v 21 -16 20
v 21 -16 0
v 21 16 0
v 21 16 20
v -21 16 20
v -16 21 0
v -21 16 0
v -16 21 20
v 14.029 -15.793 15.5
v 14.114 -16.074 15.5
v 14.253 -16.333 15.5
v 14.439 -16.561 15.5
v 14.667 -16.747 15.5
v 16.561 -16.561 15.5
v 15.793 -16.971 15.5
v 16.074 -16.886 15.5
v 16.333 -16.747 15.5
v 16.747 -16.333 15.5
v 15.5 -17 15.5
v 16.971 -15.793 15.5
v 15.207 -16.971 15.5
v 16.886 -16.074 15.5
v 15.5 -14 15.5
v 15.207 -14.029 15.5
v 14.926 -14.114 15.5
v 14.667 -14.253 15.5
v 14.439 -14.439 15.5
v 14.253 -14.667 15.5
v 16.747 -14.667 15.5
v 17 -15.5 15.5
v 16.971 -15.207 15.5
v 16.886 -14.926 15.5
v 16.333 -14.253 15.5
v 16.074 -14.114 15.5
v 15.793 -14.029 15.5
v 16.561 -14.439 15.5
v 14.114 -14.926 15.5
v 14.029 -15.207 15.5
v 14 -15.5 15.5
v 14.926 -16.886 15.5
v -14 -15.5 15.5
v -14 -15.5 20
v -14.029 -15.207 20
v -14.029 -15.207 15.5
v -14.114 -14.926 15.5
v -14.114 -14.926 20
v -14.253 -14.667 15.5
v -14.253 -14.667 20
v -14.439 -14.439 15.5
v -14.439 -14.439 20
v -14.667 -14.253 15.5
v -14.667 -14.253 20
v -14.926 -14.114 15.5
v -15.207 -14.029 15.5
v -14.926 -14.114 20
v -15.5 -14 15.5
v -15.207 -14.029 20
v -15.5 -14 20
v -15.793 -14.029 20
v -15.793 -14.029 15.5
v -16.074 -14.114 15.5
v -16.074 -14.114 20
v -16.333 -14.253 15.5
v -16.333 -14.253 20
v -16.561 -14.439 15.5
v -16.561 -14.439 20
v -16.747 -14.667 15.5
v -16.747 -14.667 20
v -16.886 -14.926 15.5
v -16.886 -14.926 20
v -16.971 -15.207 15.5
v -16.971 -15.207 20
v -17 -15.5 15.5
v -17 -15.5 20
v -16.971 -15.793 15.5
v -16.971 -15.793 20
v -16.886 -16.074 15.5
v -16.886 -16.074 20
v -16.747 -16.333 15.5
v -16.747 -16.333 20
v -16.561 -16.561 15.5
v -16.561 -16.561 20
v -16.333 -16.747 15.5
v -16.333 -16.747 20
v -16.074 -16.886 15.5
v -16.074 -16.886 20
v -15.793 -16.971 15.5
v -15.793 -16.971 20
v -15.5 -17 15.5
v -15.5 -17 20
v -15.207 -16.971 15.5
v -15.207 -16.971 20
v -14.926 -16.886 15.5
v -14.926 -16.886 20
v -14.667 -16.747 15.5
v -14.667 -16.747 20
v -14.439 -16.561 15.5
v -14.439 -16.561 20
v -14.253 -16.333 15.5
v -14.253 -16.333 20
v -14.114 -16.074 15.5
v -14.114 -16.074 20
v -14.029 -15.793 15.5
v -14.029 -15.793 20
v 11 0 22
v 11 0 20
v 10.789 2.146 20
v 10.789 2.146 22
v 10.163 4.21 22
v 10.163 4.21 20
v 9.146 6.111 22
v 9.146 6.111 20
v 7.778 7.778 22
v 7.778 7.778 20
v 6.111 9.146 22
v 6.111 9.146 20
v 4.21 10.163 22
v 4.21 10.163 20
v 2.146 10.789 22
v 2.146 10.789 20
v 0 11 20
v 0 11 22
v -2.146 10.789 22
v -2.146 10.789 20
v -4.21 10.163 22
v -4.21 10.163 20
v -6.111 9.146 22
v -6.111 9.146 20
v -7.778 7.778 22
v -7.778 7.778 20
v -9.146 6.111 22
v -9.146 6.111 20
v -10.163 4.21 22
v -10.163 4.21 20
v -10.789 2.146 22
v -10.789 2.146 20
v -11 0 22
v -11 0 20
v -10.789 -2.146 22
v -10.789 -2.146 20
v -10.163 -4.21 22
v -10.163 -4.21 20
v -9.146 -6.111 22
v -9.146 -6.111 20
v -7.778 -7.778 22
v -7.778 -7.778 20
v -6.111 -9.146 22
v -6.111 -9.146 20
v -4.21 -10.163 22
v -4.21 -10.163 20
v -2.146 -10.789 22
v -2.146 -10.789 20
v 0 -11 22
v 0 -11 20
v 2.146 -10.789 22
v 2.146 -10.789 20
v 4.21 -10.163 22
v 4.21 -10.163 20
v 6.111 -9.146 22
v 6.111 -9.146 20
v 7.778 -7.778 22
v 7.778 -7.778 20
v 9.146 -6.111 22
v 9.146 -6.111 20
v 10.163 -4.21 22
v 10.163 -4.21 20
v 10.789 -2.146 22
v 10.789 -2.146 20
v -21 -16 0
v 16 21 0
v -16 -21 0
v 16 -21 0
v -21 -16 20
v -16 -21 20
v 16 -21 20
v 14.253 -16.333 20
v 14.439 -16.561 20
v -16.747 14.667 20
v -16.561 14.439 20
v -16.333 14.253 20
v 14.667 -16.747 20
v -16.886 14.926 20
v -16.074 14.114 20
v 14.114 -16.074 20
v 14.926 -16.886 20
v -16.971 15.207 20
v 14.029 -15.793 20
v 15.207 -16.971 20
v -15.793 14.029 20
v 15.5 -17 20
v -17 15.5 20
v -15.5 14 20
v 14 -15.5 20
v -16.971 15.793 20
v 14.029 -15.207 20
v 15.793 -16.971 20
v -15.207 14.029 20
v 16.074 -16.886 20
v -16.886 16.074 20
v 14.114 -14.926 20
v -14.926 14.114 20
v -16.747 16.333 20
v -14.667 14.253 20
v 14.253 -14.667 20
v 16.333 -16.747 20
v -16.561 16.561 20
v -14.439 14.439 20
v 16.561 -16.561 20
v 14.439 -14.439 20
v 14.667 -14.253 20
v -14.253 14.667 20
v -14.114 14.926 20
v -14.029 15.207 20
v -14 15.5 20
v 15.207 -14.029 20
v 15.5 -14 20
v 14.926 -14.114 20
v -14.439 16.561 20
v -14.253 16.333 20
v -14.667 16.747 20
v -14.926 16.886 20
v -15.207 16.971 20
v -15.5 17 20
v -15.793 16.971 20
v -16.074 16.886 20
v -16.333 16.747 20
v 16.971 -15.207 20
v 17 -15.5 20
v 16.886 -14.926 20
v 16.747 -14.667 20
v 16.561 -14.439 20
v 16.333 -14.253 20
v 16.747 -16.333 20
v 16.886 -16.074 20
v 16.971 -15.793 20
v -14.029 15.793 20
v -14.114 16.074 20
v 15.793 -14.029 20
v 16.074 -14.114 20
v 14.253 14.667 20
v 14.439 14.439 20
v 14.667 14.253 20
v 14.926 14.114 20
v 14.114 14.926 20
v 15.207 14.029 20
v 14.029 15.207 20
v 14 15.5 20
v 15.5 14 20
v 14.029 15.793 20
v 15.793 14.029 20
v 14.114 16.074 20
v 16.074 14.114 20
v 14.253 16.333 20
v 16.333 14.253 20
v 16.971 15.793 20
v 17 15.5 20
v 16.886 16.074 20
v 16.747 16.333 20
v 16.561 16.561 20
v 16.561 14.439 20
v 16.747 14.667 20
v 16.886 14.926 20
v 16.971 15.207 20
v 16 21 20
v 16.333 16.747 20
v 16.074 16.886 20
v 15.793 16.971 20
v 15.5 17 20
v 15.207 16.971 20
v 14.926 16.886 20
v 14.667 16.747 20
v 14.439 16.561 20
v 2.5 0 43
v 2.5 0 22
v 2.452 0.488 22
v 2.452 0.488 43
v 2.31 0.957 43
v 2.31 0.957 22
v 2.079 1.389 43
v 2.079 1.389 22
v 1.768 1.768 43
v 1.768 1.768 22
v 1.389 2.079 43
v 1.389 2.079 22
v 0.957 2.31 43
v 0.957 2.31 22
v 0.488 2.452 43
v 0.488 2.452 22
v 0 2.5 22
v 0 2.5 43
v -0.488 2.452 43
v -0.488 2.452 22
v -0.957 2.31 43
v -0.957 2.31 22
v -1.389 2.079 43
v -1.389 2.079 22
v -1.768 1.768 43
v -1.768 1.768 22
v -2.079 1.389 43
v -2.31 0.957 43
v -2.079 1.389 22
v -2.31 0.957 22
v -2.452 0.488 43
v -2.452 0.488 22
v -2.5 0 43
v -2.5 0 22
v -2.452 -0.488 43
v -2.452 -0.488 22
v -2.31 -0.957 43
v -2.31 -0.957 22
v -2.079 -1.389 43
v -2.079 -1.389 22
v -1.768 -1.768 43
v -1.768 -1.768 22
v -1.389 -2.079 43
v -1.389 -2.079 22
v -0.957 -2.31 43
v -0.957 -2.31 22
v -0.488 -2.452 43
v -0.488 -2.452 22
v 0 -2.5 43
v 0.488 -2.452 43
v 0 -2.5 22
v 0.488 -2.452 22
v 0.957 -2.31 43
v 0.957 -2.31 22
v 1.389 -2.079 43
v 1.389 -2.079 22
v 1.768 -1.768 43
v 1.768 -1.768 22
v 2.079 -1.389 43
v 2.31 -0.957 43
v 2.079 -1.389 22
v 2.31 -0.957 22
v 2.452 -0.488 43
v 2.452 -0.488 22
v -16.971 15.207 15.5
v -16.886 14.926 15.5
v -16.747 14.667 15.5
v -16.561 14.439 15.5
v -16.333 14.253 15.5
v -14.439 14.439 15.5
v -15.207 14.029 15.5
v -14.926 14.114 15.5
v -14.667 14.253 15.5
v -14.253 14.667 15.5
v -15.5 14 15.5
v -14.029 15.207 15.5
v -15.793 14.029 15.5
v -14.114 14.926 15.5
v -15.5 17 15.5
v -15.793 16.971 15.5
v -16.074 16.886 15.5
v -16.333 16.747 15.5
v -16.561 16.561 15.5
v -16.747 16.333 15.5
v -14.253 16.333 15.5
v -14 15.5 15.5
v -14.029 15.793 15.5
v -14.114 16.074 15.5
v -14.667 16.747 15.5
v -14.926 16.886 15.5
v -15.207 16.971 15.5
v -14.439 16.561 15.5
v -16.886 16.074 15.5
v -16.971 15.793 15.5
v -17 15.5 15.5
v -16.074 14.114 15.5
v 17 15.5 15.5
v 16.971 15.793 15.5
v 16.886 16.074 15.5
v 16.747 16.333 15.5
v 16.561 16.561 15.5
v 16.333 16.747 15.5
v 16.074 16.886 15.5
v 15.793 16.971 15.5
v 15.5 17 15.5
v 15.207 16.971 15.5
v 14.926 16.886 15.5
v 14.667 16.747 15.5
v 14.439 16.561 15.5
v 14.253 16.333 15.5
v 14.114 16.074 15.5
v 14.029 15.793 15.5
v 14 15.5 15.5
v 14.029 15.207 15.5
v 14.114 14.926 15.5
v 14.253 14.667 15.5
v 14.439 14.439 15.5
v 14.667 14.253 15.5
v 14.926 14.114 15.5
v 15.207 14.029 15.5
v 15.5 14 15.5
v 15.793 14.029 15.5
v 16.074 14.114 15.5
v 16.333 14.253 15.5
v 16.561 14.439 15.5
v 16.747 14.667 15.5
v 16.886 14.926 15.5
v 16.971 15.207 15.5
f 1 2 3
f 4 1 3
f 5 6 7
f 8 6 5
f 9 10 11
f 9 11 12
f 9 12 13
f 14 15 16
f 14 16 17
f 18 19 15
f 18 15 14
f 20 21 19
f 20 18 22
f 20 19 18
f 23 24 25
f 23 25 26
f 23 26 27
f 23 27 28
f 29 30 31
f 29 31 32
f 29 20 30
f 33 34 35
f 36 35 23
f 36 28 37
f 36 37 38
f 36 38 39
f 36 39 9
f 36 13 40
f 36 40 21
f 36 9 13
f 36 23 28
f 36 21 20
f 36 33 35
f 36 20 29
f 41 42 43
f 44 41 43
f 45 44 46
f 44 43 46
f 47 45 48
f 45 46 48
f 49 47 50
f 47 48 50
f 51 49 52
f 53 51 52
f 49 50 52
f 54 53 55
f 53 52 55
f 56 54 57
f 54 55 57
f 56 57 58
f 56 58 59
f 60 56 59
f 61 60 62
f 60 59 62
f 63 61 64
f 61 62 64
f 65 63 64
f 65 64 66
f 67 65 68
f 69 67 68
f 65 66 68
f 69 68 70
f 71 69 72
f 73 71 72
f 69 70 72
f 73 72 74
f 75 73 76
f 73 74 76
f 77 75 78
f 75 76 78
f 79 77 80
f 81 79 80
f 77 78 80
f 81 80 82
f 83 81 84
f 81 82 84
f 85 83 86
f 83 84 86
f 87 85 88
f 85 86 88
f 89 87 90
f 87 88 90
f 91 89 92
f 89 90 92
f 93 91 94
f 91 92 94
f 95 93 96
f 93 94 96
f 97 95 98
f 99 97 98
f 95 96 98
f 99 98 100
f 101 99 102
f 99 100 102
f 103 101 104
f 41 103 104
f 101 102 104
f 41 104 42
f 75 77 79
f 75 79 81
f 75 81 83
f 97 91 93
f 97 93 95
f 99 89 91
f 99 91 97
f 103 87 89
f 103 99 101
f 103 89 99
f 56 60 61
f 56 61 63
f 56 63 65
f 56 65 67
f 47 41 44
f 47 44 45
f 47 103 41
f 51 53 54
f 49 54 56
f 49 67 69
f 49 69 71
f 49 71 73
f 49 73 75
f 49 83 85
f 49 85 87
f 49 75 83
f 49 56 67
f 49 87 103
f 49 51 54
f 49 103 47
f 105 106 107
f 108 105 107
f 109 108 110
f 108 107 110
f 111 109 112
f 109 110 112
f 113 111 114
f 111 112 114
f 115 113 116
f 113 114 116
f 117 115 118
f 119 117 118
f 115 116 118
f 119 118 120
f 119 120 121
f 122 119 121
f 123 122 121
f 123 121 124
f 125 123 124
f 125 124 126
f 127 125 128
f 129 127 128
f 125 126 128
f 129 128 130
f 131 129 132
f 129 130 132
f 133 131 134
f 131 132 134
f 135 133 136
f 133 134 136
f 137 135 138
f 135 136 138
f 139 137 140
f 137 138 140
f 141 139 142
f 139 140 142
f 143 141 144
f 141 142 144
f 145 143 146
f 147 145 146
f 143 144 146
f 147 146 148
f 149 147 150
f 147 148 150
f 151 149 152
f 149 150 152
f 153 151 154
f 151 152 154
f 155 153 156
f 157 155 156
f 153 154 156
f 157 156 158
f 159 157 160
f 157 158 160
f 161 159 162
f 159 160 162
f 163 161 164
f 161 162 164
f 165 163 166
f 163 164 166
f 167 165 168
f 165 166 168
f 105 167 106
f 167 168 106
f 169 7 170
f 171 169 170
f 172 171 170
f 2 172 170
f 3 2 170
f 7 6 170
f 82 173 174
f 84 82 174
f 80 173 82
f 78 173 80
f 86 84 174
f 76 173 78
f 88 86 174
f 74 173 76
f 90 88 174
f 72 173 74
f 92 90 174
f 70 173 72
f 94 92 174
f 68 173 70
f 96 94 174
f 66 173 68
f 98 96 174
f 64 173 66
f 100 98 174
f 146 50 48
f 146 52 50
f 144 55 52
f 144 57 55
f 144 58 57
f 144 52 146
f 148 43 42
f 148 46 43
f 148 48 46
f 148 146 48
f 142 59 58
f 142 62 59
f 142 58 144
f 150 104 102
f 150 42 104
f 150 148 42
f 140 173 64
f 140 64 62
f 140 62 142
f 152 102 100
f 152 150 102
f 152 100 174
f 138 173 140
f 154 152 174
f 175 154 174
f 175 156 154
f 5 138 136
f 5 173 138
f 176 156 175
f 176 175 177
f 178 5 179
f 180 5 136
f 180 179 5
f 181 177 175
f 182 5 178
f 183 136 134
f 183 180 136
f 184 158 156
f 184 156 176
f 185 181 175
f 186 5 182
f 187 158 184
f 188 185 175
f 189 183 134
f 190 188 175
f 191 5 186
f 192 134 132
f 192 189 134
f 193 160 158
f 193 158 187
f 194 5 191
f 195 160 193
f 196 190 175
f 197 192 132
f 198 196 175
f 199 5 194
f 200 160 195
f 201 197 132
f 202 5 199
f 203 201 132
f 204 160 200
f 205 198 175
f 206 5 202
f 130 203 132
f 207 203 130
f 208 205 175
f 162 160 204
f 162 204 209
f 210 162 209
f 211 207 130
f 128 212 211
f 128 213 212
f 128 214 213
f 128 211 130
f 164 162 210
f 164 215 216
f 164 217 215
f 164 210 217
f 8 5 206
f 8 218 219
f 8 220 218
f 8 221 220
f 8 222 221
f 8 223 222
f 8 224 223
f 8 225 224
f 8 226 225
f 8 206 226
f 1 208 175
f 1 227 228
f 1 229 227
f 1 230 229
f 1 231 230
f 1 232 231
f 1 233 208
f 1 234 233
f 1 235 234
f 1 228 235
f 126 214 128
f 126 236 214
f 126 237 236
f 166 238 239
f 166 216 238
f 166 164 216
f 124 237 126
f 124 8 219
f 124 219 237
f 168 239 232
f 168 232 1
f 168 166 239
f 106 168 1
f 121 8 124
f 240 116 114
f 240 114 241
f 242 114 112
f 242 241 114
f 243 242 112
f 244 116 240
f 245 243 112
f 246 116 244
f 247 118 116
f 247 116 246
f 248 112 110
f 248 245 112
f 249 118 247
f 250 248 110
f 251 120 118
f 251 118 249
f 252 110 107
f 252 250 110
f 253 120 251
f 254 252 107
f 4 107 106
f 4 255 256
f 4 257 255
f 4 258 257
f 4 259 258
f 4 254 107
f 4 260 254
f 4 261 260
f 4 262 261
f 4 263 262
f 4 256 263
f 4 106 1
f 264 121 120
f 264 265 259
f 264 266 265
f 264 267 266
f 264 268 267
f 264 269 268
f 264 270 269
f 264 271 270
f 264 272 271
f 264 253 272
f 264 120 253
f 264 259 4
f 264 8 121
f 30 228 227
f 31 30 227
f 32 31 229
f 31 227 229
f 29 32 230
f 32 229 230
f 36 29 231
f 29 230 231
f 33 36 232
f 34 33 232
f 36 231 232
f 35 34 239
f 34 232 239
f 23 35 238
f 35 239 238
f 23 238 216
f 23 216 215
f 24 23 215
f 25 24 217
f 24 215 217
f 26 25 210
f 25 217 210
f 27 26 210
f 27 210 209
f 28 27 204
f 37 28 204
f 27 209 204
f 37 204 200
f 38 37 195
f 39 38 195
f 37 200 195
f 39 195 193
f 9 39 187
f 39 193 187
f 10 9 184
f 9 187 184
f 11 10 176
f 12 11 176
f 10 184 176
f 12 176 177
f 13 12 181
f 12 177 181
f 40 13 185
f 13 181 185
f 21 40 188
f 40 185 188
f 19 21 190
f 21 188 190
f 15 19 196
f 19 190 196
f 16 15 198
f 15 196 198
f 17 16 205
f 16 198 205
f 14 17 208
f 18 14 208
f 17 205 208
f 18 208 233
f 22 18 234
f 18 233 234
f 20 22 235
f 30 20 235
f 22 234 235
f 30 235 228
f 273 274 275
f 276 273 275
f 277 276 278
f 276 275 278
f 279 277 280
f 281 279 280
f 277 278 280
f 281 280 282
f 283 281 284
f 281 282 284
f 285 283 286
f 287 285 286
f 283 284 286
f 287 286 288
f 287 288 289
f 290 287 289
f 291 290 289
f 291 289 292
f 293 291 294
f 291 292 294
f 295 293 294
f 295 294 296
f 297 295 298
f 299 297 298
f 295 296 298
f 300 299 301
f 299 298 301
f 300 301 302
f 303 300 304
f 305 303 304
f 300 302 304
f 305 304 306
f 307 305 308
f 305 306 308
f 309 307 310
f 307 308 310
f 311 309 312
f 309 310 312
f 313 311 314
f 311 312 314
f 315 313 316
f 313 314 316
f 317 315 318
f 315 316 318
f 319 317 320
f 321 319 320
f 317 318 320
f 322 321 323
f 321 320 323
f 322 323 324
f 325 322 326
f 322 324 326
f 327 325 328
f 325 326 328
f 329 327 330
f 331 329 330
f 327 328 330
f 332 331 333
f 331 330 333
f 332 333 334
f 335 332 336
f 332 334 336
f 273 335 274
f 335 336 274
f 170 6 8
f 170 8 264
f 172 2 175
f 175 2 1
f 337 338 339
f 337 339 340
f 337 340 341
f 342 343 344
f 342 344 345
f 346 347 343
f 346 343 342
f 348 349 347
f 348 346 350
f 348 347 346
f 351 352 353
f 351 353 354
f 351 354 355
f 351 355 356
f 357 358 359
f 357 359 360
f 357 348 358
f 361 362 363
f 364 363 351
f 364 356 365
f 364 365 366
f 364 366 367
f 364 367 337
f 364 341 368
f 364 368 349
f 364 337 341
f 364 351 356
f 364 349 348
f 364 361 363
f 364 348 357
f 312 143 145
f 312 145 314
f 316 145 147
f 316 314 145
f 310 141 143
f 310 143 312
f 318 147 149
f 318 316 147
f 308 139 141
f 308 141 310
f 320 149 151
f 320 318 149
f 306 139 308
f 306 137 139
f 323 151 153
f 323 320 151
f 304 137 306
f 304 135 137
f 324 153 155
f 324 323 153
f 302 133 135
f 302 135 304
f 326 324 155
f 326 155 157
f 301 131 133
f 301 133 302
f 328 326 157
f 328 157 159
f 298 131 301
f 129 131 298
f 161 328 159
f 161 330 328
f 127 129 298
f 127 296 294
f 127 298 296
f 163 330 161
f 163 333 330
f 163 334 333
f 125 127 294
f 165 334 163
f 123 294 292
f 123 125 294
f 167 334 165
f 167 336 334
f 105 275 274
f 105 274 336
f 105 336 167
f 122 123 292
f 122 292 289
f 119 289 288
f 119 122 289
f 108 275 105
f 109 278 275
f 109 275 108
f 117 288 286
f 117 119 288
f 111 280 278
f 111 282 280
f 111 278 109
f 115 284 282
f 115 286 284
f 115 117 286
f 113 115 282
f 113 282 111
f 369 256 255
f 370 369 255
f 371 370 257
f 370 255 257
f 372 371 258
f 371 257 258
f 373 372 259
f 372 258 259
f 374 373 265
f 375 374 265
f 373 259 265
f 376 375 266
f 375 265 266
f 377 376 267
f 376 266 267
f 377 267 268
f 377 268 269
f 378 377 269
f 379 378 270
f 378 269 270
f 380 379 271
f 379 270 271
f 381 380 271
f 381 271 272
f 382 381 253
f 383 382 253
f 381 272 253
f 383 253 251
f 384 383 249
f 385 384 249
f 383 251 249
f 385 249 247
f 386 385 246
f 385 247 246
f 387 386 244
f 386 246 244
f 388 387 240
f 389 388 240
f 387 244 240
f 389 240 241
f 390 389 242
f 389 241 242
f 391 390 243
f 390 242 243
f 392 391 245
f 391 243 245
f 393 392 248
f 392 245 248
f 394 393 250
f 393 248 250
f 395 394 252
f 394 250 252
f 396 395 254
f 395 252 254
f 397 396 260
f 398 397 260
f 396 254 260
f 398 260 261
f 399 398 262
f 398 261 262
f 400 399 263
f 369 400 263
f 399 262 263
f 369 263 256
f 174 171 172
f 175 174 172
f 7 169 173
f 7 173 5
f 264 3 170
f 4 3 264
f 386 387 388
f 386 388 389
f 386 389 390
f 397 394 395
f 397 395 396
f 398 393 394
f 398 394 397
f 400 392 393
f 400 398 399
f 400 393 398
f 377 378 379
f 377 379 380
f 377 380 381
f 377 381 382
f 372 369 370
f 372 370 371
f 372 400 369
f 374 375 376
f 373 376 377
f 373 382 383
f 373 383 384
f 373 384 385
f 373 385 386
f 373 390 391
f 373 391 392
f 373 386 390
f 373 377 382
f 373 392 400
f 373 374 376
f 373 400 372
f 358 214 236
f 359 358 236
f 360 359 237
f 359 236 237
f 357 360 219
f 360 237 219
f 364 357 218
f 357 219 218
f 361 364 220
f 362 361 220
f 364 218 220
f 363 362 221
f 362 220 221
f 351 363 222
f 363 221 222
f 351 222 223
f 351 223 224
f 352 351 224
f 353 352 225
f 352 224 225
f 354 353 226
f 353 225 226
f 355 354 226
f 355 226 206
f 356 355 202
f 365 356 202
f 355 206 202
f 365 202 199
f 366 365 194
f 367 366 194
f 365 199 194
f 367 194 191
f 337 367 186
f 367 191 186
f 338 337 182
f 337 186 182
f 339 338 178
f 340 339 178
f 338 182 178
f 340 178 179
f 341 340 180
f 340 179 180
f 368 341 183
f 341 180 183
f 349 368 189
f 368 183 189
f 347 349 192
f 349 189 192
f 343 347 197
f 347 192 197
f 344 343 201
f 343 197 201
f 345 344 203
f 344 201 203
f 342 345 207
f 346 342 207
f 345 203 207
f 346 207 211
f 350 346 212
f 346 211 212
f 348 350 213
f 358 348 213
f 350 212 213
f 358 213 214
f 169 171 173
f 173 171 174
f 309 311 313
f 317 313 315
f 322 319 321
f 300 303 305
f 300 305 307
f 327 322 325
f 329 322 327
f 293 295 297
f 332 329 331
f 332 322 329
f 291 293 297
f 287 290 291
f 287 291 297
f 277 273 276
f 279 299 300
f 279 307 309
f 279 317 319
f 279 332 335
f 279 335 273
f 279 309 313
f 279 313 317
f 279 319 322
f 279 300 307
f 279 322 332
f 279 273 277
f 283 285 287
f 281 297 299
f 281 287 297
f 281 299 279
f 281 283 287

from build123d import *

# Parameters (mm, degrees)
F0_W     = 42
F0_H     = 42
F1_DEPTH = 20
F2_R     = 11
F3_DEPTH = 2
F4_R     = 2.5
F5_DEPTH = 21
F6_R     = 1.5
F7_DEPTH = 4.5
F8_SIZE  = 5


with BuildPart() as f1:
    # F0 (on Top) → F1 (new body)
    with BuildSketch(Plane.XY):
        Rectangle(F0_W, F0_H)
    extrude(amount=F1_DEPTH)

    # F2 (on face) → F3 (join)
    with BuildSketch(Plane.XY.offset(20)):
        Circle(F2_R)
    extrude(amount=F3_DEPTH)

    # F4 (on face) → F5 (join)
    with BuildSketch(Plane.XY.offset(22)):
        Circle(F4_R)
    extrude(amount=F5_DEPTH)

    # F6 (on face) → F7 (cut)
    with BuildSketch(Plane.XY.offset(20)):
        with Locations((-15.5, 15.5)):
            Circle(F6_R)
        with Locations((-15.5, -15.5)):
            Circle(F6_R)
        with Locations((15.5, 15.5)):
            Circle(F6_R)
        with Locations((15.5, -15.5)):
            Circle(F6_R)
    extrude(amount=-F7_DEPTH, mode=Mode.SUBTRACT)

    # F8
    f8_edges = [f1.edges().sort_by_distance(p)[0] for p in [
        (21, 21, 10),
        (21, -21, 10),
        (-21, -21, 10),
        (-21, 21, 10),
    ]]
    chamfer(f8_edges, length=F8_SIZE)


solid = f1.part
